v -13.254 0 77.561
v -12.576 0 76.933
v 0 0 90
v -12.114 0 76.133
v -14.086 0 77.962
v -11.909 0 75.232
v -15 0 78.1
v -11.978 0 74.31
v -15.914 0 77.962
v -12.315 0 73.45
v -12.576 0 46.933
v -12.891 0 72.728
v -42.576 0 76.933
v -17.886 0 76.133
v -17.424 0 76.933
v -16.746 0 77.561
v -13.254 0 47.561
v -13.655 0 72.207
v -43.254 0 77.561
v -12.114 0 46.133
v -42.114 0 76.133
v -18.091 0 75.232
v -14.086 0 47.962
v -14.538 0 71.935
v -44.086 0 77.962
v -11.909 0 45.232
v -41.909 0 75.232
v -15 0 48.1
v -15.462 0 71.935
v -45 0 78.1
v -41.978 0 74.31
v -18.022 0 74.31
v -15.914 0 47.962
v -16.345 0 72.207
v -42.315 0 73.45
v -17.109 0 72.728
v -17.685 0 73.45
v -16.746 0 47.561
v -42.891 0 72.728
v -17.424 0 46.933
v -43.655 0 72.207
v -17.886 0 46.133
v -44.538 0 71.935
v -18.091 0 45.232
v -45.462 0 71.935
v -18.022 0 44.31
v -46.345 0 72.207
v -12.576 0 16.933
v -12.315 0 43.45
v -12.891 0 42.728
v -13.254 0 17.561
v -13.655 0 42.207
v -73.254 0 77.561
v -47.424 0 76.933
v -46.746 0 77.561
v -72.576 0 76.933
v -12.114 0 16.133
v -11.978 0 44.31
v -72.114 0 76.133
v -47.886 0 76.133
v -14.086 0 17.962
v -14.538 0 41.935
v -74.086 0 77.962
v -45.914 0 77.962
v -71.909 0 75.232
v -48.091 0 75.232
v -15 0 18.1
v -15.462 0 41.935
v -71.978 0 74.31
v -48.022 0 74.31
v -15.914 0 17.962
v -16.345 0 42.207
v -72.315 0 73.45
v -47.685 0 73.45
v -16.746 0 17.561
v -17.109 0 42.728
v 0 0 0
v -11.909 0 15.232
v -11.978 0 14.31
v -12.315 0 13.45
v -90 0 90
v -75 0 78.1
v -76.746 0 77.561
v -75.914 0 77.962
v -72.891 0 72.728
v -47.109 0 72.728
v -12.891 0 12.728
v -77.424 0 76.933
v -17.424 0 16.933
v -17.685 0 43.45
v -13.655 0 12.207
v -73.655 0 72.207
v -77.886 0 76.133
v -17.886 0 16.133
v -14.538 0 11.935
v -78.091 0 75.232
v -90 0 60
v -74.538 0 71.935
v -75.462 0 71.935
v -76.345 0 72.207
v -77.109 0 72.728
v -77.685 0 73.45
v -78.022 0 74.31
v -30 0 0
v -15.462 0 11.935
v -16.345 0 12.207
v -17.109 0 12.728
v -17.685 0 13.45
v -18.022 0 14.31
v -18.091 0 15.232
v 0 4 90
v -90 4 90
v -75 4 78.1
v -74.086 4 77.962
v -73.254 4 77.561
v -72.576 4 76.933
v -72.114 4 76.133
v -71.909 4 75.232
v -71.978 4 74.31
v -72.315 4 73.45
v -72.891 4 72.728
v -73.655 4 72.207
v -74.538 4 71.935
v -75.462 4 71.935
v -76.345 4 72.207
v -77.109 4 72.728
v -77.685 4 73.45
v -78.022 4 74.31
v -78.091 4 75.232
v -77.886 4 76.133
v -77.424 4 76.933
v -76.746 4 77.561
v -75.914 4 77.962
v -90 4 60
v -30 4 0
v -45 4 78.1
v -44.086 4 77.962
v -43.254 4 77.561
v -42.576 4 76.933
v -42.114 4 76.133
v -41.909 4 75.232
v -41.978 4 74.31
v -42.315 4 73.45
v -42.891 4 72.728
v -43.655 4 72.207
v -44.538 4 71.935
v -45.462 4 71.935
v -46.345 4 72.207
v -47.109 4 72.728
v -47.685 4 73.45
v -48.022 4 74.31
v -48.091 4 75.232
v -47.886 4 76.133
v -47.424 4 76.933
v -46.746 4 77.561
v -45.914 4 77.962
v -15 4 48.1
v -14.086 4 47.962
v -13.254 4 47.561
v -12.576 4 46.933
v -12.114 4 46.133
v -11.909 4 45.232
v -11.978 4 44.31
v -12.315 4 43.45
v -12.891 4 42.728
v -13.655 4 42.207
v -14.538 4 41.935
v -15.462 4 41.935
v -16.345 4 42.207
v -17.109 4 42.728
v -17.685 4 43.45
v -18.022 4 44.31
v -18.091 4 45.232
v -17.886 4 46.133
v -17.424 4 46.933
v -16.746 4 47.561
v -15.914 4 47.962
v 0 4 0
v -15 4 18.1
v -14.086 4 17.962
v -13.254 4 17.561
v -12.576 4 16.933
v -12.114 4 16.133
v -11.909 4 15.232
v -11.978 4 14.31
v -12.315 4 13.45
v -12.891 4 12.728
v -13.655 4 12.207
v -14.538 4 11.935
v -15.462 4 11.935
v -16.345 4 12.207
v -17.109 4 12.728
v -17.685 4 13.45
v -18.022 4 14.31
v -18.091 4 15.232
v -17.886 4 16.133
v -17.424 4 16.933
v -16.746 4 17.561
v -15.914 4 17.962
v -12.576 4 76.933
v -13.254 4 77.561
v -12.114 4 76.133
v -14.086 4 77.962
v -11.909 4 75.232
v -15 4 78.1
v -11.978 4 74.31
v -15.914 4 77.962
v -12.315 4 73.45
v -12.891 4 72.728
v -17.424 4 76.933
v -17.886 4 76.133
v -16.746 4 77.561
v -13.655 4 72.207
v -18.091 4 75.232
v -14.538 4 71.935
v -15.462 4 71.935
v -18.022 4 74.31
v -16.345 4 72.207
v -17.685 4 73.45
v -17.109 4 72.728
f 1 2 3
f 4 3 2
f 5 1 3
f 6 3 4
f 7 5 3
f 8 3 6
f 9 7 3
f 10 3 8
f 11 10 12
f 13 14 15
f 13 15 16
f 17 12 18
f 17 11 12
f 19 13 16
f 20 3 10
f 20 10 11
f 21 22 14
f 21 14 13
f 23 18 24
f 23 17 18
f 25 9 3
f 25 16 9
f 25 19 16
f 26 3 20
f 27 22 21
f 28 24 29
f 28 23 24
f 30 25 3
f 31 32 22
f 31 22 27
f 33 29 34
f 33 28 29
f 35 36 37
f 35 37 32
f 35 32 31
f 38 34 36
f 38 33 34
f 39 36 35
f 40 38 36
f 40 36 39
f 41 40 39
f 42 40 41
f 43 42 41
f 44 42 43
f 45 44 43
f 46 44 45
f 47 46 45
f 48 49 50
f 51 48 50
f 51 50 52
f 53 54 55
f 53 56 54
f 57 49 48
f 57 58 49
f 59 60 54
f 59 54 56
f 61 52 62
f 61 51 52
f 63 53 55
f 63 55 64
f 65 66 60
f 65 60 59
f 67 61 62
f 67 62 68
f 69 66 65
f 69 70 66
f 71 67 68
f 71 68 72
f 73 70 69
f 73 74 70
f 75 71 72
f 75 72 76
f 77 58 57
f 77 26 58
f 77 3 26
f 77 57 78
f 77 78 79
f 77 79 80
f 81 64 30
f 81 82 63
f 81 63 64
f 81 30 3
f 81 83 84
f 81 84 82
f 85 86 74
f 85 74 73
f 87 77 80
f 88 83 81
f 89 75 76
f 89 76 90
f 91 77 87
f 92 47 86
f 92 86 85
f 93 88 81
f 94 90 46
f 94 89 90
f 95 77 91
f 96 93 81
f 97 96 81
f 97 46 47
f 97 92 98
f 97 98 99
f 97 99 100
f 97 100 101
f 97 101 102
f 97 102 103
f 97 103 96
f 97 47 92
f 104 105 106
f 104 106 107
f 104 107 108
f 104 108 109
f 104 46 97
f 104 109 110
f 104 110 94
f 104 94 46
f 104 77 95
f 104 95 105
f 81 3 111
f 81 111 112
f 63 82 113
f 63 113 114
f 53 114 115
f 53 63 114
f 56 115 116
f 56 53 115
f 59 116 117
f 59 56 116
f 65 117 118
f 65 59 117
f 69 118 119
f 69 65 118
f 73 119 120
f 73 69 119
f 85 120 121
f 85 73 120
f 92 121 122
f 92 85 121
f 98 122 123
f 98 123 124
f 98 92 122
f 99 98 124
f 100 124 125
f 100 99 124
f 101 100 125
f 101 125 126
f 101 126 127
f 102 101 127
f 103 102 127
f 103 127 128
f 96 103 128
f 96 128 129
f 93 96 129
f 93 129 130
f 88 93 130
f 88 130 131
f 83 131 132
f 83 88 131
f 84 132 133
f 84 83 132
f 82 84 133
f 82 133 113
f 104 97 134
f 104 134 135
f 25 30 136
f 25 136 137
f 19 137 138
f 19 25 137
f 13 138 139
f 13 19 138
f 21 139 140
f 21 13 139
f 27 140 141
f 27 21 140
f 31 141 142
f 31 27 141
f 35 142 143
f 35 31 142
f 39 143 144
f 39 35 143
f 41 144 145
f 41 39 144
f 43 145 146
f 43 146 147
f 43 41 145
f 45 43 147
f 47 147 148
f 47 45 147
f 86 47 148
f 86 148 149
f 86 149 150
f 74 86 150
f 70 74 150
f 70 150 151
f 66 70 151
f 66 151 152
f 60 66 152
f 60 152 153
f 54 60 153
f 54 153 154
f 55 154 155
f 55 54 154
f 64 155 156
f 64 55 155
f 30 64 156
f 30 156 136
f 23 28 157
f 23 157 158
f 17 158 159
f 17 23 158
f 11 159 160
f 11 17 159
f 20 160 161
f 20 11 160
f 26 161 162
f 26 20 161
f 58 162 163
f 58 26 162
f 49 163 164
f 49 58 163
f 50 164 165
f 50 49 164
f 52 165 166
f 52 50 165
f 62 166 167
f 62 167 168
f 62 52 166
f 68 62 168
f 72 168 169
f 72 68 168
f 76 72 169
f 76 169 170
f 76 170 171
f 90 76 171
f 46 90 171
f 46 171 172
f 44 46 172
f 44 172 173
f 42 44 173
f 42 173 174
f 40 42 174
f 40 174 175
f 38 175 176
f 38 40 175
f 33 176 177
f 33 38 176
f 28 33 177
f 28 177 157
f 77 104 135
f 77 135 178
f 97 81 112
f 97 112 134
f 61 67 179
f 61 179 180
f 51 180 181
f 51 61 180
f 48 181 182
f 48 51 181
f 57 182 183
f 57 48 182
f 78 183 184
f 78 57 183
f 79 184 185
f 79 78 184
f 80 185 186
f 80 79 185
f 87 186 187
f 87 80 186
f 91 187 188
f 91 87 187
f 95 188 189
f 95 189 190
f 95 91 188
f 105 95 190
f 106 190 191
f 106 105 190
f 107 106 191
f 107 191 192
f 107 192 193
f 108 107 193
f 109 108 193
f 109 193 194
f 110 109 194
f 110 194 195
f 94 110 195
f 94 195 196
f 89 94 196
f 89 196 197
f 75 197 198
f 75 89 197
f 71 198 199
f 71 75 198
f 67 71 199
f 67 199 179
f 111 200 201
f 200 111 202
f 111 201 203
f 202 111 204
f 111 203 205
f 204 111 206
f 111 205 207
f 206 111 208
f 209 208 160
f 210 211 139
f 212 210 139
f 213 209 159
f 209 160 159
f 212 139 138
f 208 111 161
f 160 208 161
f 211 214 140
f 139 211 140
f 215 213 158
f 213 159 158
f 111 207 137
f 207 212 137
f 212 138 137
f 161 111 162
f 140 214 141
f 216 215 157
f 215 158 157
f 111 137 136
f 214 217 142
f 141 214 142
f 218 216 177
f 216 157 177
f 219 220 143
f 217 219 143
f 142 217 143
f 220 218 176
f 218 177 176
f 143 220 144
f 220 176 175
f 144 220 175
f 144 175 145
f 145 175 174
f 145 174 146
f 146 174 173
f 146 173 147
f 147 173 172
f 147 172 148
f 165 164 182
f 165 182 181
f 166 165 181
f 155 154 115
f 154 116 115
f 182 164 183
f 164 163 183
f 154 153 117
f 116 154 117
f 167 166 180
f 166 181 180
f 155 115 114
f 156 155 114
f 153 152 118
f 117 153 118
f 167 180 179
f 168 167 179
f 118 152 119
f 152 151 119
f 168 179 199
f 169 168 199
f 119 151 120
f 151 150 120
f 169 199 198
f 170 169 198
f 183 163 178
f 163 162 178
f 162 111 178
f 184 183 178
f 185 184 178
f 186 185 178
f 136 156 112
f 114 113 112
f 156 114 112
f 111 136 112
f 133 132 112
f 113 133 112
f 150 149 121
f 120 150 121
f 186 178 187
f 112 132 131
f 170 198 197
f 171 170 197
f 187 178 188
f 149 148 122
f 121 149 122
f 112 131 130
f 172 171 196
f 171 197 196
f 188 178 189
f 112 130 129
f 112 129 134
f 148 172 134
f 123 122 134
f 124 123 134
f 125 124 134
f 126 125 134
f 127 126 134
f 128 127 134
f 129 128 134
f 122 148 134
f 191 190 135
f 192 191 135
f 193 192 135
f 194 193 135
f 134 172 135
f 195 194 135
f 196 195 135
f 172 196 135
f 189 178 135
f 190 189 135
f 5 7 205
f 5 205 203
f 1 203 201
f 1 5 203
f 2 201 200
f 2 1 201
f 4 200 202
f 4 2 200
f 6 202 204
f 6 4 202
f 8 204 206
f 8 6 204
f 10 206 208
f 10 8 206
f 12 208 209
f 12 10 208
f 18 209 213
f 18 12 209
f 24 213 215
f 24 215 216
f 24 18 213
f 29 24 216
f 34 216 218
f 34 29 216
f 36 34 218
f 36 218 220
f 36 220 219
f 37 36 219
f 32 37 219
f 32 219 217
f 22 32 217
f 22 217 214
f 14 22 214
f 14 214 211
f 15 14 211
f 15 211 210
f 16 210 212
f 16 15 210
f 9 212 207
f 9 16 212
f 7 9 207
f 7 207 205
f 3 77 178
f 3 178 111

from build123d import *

# Parameters (mm, degrees)
SKETCH1_R           = 3.1
BOSS_EXTRUDE1_DEPTH = 4


with BuildPart() as part:
    # Sketch1 → Boss-Extrude1 (new body)
    with BuildSketch(Plane(origin=(0, 0, 0), x_dir=(1, 0, 0), z_dir=(0, 1, 0))):
        Polygon((0, 0), (0, -90), (-90, -90), (-90, -60), (-30, 0), align=None)
        with Locations(Location((-15, -15, 0), (0, 0, 270))):
            Circle(SKETCH1_R, mode=Mode.SUBTRACT)
        with Locations(Location((-15, -45, 0), (0, 0, 270))):
            Circle(SKETCH1_R, mode=Mode.SUBTRACT)
        with Locations(Location((-15, -75, 0), (0, 0, 270))):
            Circle(SKETCH1_R, mode=Mode.SUBTRACT)
        with Locations(Location((-45, -75, 0), (0, 0, 270))):
            Circle(SKETCH1_R, mode=Mode.SUBTRACT)
        with Locations(Location((-75, -75, 0), (0, 0, 270))):
            Circle(SKETCH1_R, mode=Mode.SUBTRACT)
    extrude(amount=BOSS_EXTRUDE1_DEPTH)


solid = part.part
